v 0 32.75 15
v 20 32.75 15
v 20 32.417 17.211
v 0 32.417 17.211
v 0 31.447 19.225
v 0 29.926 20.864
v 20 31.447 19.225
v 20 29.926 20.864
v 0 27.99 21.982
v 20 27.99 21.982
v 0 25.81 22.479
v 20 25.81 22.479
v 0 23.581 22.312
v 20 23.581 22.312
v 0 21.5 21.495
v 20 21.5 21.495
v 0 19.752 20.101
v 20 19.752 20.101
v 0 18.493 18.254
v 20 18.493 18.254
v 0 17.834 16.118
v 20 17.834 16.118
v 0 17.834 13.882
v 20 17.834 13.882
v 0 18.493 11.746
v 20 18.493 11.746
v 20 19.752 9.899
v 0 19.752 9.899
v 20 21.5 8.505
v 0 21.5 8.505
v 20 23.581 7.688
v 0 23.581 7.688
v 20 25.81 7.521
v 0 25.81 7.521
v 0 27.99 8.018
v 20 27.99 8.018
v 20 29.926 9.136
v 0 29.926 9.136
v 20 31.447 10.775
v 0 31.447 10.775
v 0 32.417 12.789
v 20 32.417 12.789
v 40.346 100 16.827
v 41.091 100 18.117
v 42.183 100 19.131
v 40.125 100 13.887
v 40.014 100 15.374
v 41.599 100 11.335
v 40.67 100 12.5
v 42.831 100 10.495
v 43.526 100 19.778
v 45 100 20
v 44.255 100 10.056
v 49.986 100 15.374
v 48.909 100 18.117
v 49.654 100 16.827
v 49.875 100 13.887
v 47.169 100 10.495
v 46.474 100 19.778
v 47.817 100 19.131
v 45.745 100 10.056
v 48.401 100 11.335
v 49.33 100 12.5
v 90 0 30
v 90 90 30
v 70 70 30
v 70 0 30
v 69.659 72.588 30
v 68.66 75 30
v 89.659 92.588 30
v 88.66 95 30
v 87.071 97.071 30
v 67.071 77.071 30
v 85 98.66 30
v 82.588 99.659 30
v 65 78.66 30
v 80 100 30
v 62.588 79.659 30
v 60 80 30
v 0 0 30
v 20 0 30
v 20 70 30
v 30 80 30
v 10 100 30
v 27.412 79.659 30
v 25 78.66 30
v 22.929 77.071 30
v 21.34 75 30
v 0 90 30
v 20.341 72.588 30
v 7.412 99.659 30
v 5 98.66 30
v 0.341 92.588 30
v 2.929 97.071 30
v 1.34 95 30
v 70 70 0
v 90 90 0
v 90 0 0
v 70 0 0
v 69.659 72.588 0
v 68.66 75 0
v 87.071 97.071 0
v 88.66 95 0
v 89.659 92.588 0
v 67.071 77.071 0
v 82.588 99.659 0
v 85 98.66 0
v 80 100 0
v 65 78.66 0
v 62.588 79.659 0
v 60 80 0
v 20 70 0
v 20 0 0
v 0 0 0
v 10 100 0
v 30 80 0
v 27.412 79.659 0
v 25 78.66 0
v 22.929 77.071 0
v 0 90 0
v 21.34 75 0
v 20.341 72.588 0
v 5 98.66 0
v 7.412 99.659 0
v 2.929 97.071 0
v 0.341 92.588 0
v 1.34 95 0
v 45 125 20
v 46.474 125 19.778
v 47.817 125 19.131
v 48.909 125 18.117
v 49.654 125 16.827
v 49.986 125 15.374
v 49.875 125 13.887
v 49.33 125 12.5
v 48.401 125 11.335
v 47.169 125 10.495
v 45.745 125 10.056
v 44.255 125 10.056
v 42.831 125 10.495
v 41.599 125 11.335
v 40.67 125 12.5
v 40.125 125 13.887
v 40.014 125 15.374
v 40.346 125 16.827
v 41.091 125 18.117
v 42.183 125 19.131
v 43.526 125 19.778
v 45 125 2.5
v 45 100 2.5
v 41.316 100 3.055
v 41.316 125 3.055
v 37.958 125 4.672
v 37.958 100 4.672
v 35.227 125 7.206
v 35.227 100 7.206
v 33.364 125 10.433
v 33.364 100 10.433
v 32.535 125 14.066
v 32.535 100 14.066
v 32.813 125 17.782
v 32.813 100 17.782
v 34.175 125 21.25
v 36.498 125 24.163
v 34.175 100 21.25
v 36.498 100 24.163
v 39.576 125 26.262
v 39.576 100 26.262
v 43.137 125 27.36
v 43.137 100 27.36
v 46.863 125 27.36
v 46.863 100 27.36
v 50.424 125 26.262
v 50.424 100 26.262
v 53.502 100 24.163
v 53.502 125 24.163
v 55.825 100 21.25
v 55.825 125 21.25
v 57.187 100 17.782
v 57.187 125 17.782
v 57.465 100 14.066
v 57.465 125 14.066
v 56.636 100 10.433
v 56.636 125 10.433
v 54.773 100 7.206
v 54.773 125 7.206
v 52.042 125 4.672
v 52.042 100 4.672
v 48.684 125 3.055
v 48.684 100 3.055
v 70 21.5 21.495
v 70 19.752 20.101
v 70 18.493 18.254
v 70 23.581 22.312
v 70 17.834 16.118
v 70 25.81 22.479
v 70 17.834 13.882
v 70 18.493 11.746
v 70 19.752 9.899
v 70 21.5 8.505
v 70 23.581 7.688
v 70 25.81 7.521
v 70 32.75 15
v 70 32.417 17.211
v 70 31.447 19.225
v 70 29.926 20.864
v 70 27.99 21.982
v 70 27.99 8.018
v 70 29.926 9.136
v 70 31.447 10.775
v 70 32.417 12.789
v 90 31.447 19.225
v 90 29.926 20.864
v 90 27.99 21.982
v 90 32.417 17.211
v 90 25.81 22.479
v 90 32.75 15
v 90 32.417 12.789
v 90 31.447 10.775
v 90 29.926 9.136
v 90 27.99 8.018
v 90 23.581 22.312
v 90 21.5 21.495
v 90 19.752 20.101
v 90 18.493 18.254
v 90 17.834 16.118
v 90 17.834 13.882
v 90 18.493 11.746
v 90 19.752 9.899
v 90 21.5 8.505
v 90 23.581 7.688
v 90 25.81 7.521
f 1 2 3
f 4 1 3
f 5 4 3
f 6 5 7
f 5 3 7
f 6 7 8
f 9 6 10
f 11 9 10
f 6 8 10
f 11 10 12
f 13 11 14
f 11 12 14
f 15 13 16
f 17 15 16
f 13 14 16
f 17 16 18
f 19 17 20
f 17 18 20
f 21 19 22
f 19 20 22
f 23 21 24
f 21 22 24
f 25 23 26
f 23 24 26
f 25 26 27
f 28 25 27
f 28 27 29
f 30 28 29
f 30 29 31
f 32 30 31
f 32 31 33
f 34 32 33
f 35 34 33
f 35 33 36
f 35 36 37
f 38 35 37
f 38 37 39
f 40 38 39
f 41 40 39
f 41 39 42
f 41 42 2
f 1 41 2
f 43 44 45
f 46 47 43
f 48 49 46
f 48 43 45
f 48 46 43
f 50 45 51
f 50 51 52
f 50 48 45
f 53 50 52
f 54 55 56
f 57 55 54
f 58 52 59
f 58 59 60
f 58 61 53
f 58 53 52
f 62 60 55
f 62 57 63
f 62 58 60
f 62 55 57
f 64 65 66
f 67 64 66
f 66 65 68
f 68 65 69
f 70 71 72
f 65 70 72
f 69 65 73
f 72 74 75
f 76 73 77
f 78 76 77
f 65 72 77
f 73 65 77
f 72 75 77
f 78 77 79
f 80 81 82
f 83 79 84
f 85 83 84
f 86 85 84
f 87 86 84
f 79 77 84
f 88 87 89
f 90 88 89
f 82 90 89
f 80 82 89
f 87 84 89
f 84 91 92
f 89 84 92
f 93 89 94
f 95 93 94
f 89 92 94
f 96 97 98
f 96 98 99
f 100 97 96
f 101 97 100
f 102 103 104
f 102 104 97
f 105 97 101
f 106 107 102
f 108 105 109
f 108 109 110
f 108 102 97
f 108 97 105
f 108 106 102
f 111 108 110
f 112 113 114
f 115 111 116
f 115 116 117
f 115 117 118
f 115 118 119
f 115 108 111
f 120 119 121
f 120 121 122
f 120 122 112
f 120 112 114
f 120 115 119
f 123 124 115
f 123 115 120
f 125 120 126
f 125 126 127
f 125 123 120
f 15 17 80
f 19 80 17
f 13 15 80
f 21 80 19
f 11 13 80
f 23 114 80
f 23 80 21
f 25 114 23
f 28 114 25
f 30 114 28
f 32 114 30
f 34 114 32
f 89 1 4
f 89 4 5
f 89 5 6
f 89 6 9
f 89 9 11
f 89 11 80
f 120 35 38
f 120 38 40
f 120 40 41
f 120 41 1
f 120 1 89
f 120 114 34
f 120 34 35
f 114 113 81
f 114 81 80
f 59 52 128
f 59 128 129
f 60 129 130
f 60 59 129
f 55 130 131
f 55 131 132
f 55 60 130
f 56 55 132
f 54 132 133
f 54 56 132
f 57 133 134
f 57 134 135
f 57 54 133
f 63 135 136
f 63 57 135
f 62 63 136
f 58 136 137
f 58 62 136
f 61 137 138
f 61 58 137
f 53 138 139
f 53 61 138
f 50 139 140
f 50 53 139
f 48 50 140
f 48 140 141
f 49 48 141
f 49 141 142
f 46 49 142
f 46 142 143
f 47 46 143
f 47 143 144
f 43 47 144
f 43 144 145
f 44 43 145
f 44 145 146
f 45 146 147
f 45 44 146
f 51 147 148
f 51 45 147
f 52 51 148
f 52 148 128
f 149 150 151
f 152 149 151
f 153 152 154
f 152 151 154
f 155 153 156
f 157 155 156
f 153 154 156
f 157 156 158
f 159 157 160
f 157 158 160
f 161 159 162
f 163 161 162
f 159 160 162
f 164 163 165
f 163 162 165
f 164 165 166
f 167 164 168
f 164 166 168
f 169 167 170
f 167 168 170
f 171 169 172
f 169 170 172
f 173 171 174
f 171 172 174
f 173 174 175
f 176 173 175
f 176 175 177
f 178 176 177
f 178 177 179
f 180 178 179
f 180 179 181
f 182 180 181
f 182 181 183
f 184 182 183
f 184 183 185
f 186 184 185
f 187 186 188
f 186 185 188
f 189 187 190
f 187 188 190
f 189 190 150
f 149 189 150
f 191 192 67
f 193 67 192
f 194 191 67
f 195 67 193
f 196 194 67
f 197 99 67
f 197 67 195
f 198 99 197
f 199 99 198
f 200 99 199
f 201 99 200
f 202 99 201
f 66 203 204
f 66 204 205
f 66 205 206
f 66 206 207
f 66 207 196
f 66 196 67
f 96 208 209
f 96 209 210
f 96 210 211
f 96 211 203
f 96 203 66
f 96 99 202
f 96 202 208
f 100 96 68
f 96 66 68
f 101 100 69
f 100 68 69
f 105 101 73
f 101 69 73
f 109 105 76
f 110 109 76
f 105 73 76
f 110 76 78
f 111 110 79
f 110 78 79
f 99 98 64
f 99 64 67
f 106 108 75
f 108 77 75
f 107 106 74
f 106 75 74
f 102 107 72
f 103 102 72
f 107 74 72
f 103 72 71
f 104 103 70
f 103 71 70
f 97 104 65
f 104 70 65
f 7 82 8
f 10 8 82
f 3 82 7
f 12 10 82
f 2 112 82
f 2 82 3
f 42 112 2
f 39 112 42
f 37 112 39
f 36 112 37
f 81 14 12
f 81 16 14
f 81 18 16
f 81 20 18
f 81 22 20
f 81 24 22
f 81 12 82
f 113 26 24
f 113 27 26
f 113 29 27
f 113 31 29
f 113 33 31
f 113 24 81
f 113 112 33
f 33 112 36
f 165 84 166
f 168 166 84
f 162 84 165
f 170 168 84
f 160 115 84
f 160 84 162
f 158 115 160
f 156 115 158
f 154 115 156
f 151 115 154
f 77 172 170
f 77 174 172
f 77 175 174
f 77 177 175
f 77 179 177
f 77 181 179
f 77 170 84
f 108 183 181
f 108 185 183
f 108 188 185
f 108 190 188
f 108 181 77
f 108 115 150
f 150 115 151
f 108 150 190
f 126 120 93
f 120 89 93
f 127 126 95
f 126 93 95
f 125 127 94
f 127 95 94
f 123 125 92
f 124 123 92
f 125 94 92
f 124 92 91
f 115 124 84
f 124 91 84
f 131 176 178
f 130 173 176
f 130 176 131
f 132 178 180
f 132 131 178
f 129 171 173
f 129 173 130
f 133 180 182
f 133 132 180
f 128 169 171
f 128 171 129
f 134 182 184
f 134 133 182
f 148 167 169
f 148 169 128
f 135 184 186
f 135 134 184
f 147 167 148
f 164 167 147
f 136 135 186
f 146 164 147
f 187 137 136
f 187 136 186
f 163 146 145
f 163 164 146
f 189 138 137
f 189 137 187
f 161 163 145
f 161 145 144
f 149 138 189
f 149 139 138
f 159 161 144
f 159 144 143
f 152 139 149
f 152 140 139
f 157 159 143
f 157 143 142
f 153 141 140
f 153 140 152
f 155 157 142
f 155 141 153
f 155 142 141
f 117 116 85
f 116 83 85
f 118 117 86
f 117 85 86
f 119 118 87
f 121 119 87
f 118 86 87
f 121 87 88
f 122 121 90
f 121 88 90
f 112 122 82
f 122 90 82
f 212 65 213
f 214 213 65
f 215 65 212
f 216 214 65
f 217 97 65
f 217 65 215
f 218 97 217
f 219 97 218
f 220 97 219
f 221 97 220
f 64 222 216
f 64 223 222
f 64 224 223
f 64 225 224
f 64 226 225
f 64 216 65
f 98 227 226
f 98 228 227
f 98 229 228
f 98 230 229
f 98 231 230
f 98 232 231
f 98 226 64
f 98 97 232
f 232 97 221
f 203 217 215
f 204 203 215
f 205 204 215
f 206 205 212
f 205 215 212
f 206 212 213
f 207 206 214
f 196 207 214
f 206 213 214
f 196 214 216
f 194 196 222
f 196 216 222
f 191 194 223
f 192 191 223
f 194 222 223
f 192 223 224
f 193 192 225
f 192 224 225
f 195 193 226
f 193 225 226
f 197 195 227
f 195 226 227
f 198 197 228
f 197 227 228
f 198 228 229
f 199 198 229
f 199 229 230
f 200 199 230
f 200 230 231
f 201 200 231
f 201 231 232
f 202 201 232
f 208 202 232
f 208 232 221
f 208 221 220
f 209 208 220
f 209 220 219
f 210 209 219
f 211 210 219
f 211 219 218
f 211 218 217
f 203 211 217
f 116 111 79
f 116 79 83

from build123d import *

# Parameters (mm, degrees)
BOSS_EXTRUDE1_DEPTH = 30
FILLET1_R           = 10
SKETCH2_R           = 7.5
CUT_EXTRUDE1_DEPTH  = 138.840487521
SKETCH3_R           = 12.5
SKETCH3_R_2         = 5
BOSS_EXTRUDE2_DEPTH = 25


with BuildPart() as part:
    # Sketch1 → Boss-Extrude1 (new body)
    with BuildSketch(Plane.XY):
        Polygon((0, 0), (0, 100), (90, 100), (90, 0), (70, 0), (70, 80), (20, 80), (20, 0), align=None)
    extrude(amount=BOSS_EXTRUDE1_DEPTH)

    # Fillet1
    fillet1_edges = [part.edges().sort_by_distance(p)[0] for p in [
        (0, 100, 15),
        (90, 100, 15),
        (70, 80, 15),
        (20, 80, 15),
    ]]
    fillet(fillet1_edges, radius=FILLET1_R)

    # Sketch2 → Cut-Extrude1 (cut, through all)
    with BuildSketch(Plane(origin=(90, 0, 0), x_dir=(0, 0, -1), z_dir=(1, 0, 0))):
        with Locations(Location((-15, 25.249892163, 0), (0, 0, 90))):
            Circle(SKETCH2_R)
    extrude(amount=-CUT_EXTRUDE1_DEPTH, mode=Mode.SUBTRACT)

    # Sketch3 → Boss-Extrude2 (add)
    with BuildSketch(Plane(origin=(0, 100, 0), x_dir=(1, 0, 0), z_dir=(0, 1, 0))):
        with Locations(Location((45, -15, 0), (0, 0, 90))):
            Circle(SKETCH3_R)
        with Locations(Location((45, -15, 0), (0, 0, 270))):
            Circle(SKETCH3_R_2, mode=Mode.SUBTRACT)
    extrude(amount=BOSS_EXTRUDE2_DEPTH)


solid = part.part
